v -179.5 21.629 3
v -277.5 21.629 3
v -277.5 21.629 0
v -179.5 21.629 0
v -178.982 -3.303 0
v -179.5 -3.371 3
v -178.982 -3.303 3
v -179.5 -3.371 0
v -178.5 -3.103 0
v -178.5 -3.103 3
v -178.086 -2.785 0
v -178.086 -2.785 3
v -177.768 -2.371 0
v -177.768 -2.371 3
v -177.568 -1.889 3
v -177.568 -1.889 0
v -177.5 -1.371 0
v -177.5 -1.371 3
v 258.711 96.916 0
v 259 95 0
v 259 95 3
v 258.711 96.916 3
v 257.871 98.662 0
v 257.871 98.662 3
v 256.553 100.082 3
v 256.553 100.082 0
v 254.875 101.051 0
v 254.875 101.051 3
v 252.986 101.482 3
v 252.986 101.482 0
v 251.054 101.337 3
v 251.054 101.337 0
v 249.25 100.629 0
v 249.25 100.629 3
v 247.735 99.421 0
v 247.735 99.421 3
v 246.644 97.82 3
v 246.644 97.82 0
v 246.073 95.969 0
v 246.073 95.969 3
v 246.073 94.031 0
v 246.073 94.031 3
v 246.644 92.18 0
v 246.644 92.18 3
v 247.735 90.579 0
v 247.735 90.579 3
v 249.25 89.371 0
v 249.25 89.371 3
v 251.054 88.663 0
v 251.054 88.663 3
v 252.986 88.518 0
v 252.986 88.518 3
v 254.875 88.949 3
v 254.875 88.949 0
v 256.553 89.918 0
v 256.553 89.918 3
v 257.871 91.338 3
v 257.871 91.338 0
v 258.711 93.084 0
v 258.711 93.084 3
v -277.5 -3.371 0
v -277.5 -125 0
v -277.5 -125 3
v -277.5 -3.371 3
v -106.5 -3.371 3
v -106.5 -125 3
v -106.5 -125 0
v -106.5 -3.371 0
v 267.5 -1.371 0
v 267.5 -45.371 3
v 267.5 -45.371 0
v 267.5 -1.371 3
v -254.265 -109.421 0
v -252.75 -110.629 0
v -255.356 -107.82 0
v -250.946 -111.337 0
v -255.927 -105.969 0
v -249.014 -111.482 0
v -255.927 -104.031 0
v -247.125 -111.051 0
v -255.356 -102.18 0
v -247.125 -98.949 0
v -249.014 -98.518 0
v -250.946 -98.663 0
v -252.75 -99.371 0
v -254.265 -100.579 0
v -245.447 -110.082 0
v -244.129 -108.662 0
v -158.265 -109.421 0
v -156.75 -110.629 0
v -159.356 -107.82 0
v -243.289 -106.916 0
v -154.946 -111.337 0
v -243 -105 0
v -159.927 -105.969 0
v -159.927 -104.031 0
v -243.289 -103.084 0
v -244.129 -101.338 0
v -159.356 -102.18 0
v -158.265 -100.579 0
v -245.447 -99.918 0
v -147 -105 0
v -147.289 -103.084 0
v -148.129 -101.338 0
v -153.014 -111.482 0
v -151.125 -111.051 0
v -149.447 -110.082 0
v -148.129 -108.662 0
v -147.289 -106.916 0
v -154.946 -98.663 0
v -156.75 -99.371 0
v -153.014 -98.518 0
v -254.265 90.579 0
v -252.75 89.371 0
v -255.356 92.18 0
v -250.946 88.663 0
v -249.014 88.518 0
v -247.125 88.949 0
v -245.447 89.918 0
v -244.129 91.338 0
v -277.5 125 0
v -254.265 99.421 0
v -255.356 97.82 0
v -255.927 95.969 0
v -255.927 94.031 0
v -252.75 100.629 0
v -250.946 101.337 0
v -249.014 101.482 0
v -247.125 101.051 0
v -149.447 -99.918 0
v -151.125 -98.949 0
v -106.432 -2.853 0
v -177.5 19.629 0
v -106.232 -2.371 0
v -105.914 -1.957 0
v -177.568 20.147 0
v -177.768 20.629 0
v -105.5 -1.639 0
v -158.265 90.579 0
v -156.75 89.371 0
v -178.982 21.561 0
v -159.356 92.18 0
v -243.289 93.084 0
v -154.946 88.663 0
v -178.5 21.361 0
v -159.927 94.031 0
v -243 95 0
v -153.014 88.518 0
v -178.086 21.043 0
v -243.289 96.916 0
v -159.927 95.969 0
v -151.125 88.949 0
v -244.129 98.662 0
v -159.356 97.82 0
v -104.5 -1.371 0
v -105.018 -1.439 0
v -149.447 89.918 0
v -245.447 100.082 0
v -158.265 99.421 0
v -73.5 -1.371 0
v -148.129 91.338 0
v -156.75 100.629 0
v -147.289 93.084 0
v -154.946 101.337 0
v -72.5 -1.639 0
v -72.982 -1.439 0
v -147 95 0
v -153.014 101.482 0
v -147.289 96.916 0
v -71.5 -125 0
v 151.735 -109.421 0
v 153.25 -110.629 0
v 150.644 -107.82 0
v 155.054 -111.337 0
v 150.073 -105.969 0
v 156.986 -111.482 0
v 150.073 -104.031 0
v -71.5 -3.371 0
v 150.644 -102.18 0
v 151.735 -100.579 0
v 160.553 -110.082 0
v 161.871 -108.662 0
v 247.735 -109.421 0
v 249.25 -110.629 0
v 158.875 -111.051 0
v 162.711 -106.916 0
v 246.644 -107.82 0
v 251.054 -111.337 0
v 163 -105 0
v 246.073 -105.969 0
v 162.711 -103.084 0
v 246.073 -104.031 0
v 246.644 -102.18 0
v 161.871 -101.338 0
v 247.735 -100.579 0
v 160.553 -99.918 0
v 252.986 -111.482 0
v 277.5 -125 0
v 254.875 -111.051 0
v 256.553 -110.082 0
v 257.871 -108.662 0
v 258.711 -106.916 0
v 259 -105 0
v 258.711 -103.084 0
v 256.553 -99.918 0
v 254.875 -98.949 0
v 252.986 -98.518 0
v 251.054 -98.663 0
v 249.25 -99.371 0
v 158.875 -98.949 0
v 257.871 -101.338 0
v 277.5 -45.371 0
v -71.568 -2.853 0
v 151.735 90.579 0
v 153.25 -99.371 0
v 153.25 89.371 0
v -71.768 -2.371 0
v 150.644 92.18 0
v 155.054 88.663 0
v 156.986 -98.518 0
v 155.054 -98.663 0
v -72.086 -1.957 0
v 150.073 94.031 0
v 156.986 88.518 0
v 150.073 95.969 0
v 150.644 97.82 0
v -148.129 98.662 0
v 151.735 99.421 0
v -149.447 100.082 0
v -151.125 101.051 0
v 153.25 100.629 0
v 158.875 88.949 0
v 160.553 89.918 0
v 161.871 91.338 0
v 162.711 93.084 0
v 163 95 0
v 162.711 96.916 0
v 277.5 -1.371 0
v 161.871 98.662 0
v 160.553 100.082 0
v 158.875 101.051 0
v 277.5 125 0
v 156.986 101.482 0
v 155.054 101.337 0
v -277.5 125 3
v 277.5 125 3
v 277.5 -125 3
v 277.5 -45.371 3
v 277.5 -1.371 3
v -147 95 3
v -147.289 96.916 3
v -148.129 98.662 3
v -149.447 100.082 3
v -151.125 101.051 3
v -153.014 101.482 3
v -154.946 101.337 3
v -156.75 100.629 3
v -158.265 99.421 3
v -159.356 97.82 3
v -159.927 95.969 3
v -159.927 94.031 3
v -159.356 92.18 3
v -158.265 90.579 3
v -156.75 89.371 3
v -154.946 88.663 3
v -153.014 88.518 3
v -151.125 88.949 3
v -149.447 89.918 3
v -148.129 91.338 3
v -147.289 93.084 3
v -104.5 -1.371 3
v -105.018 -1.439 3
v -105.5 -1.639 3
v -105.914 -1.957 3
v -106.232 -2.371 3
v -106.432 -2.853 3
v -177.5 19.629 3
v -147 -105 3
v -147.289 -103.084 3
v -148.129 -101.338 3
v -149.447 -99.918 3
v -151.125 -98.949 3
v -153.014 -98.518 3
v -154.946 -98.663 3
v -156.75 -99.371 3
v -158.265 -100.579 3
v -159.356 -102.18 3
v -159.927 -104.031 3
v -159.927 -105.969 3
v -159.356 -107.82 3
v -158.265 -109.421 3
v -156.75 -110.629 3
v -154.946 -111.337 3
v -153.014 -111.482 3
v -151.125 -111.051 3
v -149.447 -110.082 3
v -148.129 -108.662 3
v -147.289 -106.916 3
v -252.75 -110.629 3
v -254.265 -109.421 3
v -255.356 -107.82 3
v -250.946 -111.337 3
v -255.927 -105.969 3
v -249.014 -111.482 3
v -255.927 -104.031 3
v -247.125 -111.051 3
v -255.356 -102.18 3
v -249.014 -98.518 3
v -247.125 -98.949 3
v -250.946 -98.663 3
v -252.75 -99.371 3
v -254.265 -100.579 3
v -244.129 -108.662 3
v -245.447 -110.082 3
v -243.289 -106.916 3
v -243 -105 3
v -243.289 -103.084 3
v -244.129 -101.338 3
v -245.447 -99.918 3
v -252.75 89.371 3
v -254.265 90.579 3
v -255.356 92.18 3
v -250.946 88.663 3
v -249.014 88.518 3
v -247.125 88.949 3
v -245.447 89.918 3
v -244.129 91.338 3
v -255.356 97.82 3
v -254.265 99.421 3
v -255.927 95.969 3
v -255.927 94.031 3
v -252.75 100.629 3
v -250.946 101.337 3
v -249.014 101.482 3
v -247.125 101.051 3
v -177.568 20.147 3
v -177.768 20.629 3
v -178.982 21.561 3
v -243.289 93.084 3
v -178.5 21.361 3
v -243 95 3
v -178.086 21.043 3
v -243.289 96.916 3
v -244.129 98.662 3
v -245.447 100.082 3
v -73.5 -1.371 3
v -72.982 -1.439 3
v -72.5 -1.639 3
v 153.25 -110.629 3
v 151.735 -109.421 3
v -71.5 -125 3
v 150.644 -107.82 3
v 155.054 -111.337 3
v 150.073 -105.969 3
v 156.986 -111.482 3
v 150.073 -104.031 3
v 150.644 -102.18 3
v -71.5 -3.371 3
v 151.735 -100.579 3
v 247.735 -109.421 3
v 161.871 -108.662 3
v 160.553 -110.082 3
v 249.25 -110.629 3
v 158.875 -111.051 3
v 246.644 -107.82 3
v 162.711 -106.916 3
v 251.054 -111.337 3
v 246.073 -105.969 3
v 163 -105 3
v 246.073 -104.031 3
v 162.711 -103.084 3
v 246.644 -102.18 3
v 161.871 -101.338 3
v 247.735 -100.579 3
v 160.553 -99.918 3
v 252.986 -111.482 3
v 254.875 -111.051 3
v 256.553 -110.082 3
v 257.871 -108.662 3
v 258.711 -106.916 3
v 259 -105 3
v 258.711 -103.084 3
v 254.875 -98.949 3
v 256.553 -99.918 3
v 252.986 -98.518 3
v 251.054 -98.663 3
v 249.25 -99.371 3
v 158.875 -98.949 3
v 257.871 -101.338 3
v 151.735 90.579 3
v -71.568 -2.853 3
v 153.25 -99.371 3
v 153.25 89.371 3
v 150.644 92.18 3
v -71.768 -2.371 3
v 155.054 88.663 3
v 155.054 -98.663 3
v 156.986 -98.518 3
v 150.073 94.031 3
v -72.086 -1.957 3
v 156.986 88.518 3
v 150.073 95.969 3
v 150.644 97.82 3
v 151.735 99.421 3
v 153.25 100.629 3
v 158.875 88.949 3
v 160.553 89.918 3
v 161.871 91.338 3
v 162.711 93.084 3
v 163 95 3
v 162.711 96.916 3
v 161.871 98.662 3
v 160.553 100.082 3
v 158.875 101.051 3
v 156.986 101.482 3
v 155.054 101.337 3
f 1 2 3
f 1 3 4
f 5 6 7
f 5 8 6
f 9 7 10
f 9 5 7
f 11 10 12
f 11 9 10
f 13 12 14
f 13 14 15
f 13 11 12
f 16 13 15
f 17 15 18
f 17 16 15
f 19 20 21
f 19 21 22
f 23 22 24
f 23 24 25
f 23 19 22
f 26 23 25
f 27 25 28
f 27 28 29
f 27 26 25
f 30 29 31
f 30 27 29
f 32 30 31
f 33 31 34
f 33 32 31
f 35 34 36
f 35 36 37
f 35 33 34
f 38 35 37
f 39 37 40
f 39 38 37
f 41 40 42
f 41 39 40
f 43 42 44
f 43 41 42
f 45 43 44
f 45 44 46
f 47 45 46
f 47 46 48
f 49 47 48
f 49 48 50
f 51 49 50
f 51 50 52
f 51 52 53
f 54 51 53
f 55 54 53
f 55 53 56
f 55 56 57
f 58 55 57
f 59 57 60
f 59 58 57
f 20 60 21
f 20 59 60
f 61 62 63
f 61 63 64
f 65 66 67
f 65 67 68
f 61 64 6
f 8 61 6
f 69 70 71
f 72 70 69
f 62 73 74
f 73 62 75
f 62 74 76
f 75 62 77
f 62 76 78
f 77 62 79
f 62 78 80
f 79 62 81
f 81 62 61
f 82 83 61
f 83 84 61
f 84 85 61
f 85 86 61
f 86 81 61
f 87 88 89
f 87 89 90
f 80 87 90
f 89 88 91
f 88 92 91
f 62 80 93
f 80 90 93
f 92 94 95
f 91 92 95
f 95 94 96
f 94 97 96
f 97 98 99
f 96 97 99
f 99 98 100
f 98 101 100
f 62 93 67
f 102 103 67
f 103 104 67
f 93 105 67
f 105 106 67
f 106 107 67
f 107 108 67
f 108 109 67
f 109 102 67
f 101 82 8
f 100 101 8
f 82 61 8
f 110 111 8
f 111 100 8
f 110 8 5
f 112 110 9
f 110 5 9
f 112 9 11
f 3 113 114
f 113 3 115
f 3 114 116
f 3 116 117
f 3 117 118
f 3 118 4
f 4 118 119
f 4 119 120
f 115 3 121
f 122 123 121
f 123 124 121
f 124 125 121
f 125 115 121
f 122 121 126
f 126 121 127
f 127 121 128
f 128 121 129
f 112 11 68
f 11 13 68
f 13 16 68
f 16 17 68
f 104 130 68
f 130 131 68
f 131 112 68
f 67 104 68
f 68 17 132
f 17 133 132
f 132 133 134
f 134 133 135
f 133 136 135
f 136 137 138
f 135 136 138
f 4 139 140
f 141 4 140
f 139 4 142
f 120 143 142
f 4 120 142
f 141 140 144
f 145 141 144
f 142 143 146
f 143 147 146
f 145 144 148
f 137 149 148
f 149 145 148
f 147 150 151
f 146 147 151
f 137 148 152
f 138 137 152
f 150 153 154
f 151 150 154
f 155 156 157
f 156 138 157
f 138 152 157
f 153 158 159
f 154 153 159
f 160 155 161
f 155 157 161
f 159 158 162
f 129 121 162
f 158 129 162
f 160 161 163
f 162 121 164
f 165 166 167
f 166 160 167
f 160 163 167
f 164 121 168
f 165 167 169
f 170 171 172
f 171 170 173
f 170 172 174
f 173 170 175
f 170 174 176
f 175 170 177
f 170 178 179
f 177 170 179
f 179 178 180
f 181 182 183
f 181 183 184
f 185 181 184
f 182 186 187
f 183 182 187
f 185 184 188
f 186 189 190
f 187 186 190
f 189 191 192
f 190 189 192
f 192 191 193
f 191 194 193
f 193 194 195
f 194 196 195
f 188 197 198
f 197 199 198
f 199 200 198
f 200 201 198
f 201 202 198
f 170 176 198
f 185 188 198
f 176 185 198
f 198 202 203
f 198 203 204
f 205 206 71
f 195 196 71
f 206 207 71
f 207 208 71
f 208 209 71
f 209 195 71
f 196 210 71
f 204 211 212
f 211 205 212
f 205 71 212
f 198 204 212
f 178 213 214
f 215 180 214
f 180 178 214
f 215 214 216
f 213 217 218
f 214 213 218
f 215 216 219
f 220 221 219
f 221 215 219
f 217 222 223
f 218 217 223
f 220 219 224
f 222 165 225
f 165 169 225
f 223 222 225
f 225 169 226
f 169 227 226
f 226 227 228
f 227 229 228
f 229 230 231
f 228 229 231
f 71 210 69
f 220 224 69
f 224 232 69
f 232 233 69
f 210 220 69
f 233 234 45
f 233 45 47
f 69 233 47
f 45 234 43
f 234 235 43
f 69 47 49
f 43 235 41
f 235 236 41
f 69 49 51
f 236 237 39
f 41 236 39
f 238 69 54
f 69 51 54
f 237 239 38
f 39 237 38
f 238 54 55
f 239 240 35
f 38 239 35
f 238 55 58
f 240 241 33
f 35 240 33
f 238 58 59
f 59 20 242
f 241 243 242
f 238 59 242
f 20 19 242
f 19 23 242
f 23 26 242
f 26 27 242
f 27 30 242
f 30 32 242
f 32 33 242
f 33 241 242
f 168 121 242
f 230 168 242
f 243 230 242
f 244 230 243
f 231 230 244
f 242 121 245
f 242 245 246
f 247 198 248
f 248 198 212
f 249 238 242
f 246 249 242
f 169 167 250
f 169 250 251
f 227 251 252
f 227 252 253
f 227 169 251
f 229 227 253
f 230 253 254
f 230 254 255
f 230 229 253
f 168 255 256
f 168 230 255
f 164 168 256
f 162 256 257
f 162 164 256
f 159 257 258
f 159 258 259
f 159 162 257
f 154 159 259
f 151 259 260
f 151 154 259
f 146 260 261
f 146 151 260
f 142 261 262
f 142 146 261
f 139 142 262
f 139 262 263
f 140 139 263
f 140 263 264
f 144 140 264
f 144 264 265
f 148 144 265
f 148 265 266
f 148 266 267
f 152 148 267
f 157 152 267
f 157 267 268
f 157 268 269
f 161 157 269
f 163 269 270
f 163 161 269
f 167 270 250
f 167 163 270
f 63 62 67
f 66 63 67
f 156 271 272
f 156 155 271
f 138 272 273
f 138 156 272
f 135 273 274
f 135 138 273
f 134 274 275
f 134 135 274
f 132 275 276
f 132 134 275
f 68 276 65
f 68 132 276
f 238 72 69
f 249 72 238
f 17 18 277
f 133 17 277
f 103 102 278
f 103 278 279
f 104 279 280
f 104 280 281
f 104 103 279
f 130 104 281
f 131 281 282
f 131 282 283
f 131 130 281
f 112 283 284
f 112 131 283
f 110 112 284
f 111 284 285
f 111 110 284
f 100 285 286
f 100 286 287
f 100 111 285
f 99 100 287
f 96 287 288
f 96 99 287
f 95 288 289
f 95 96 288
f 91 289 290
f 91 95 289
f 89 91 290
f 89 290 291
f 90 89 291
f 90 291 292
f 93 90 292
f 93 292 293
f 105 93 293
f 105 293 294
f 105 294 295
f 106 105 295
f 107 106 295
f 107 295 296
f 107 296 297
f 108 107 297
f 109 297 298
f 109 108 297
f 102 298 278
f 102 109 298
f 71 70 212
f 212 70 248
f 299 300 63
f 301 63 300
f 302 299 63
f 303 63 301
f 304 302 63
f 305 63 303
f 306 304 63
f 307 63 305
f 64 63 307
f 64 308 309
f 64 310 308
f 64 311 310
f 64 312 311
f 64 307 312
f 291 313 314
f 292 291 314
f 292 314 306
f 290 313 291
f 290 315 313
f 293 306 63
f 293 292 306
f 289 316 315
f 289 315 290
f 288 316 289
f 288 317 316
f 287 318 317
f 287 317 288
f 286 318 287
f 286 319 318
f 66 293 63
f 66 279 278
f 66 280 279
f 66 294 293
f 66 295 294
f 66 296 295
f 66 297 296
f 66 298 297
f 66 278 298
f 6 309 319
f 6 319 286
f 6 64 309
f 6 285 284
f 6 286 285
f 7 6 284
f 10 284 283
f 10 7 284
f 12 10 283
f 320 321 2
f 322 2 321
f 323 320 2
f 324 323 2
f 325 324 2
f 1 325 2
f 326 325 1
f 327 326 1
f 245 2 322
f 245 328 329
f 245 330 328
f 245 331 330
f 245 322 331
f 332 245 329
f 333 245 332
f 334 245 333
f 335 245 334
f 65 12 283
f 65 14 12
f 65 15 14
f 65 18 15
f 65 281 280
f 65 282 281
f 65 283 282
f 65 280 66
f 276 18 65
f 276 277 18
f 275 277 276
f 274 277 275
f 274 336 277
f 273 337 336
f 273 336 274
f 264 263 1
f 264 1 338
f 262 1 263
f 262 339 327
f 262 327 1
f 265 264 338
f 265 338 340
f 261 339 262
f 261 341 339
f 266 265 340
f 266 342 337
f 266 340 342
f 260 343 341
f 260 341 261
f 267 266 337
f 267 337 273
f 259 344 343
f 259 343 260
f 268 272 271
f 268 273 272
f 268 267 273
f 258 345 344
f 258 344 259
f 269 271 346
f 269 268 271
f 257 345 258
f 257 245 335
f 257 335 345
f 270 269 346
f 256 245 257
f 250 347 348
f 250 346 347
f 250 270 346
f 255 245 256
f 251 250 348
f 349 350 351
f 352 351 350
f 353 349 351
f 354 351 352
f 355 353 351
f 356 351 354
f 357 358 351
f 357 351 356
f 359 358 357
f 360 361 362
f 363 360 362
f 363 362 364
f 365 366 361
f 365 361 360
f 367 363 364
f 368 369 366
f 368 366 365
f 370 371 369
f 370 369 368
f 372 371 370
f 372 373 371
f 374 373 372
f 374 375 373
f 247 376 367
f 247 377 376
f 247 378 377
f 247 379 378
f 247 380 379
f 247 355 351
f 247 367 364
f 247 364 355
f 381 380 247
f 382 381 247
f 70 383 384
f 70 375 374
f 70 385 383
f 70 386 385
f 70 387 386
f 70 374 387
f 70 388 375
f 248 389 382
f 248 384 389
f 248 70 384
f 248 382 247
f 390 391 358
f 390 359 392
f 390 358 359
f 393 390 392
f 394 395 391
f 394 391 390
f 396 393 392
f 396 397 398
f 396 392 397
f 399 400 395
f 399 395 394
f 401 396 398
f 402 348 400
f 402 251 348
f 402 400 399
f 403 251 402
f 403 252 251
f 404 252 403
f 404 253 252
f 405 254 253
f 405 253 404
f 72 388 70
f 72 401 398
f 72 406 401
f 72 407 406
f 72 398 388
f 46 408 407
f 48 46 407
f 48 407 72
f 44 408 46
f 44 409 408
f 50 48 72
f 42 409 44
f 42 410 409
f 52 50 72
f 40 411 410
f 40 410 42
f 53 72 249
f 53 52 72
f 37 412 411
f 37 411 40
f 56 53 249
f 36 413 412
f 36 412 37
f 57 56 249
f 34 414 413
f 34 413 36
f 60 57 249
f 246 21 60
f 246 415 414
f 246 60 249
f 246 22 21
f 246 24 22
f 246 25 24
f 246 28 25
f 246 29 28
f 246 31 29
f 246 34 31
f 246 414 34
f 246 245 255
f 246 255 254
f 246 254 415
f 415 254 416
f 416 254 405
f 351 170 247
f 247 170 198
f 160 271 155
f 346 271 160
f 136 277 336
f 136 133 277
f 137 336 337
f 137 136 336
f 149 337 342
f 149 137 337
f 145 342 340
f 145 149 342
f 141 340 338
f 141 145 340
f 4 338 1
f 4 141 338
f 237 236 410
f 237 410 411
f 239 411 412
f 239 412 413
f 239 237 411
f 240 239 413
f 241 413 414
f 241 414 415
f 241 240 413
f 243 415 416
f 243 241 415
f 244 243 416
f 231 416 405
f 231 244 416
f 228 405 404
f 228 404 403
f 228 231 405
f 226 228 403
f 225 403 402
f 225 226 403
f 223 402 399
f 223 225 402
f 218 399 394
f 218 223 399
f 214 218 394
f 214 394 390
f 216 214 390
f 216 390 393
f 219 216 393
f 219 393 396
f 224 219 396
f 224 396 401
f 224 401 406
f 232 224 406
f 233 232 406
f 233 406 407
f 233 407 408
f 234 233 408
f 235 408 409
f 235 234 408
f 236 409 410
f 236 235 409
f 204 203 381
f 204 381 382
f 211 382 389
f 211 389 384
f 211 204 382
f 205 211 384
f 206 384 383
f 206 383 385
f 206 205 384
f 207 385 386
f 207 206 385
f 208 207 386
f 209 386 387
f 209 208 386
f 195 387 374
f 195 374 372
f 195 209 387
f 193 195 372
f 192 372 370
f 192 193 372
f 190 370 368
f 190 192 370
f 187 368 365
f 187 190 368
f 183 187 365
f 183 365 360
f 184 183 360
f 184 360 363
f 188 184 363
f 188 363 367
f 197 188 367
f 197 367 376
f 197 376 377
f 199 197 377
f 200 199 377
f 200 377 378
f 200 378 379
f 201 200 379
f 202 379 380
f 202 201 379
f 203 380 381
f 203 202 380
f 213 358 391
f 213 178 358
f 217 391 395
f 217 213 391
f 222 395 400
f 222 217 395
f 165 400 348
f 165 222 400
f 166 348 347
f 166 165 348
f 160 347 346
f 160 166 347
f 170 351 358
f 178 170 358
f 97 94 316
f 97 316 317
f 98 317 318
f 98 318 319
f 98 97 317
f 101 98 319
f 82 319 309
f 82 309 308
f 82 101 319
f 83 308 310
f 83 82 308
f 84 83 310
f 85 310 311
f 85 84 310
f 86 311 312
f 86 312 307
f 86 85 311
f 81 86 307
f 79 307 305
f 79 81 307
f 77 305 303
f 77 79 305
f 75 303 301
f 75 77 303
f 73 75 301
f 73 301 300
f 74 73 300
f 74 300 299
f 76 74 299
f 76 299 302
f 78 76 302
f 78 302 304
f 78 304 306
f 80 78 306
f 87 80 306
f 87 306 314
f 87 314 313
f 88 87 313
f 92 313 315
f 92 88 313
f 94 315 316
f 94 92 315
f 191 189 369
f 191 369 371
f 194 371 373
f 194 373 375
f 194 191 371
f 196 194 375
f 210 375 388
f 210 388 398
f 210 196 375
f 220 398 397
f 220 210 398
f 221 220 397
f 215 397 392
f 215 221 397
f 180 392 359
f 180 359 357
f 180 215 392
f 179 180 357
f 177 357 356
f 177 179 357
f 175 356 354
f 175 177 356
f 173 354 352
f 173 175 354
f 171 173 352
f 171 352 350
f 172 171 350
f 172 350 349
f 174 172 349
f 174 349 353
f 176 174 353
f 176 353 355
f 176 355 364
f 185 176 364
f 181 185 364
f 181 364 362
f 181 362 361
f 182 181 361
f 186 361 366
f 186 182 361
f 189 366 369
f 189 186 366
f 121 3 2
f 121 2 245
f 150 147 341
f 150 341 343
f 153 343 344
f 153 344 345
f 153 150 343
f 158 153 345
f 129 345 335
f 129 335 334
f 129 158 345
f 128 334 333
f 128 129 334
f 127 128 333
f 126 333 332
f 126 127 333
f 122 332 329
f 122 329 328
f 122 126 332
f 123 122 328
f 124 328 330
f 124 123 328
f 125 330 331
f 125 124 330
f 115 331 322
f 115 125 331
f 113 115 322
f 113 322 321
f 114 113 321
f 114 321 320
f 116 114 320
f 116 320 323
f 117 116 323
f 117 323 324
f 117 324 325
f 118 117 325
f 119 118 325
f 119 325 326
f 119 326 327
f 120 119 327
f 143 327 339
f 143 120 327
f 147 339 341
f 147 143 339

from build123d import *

# Parameters (mm, degrees)
ESQUISSE1_W             = 555
ESQUISSE1_H             = 250
ESQUISSE1_R             = 6.5
BOSS_EXTRU_1_DEPTH      = 3
ESQUISSE4_W             = 100
ESQUISSE4_H             = 25
ESQUISSE4_W_2           = 35
ESQUISSE4_H_2           = 123.628962184
ESQUISSE4_W_3           = 10
ESQUISSE4_H_3           = 44
ENL_V_MAT_EXTRU_3_DEPTH = 10
CONG_1_R                = 2


with BuildPart() as part:
    # Esquisse1 → Boss.-Extru.1 (new body)
    with BuildSketch(Plane.XY):
        Rectangle(ESQUISSE1_W, ESQUISSE1_H)
        with Locations((156.5, 95)):
            Circle(ESQUISSE1_R, mode=Mode.SUBTRACT)
        with Locations((252.5, 95)):
            Circle(ESQUISSE1_R, mode=Mode.SUBTRACT)
        with Locations((156.5, -105)):
            Circle(ESQUISSE1_R, mode=Mode.SUBTRACT)
        with Locations((252.5, -105)):
            Circle(ESQUISSE1_R, mode=Mode.SUBTRACT)
        with Locations((-153.5, -105)):
            Circle(ESQUISSE1_R, mode=Mode.SUBTRACT)
        with Locations((-153.5, 95)):
            Circle(ESQUISSE1_R, mode=Mode.SUBTRACT)
        with Locations((-249.5, 95)):
            Circle(ESQUISSE1_R, mode=Mode.SUBTRACT)
        with Locations((-249.5, -105)):
            Circle(ESQUISSE1_R, mode=Mode.SUBTRACT)
    extrude(amount=BOSS_EXTRU_1_DEPTH)

    # Esquisse4 → Enlèv. mat.-Extru.3 (cut)
    with BuildSketch(Plane.XY.offset(3)):
        with Locations((-227.5, 9.128962184)):
            Rectangle(ESQUISSE4_W, ESQUISSE4_H)
        with Locations((-89, -63.185518908)):
            Rectangle(ESQUISSE4_W_2, ESQUISSE4_H_2)
        with Locations((272.5, -23.371037816)):
            Rectangle(ESQUISSE4_W_3, ESQUISSE4_H_3)
    extrude(amount=-ENL_V_MAT_EXTRU_3_DEPTH, mode=Mode.SUBTRACT)

    # Congé1
    cong_1_edges = [part.edges().sort_by_distance(p)[0] for p in [
        (-177.5, 21.628962184, 1.5),
        (-177.5, -3.371037816, 1.5),
        (-106.5, -1.371037816, 1.5),
        (-71.5, -1.371037816, 1.5),
    ]]
    fillet(cong_1_edges, radius=CONG_1_R)


solid = part.part
